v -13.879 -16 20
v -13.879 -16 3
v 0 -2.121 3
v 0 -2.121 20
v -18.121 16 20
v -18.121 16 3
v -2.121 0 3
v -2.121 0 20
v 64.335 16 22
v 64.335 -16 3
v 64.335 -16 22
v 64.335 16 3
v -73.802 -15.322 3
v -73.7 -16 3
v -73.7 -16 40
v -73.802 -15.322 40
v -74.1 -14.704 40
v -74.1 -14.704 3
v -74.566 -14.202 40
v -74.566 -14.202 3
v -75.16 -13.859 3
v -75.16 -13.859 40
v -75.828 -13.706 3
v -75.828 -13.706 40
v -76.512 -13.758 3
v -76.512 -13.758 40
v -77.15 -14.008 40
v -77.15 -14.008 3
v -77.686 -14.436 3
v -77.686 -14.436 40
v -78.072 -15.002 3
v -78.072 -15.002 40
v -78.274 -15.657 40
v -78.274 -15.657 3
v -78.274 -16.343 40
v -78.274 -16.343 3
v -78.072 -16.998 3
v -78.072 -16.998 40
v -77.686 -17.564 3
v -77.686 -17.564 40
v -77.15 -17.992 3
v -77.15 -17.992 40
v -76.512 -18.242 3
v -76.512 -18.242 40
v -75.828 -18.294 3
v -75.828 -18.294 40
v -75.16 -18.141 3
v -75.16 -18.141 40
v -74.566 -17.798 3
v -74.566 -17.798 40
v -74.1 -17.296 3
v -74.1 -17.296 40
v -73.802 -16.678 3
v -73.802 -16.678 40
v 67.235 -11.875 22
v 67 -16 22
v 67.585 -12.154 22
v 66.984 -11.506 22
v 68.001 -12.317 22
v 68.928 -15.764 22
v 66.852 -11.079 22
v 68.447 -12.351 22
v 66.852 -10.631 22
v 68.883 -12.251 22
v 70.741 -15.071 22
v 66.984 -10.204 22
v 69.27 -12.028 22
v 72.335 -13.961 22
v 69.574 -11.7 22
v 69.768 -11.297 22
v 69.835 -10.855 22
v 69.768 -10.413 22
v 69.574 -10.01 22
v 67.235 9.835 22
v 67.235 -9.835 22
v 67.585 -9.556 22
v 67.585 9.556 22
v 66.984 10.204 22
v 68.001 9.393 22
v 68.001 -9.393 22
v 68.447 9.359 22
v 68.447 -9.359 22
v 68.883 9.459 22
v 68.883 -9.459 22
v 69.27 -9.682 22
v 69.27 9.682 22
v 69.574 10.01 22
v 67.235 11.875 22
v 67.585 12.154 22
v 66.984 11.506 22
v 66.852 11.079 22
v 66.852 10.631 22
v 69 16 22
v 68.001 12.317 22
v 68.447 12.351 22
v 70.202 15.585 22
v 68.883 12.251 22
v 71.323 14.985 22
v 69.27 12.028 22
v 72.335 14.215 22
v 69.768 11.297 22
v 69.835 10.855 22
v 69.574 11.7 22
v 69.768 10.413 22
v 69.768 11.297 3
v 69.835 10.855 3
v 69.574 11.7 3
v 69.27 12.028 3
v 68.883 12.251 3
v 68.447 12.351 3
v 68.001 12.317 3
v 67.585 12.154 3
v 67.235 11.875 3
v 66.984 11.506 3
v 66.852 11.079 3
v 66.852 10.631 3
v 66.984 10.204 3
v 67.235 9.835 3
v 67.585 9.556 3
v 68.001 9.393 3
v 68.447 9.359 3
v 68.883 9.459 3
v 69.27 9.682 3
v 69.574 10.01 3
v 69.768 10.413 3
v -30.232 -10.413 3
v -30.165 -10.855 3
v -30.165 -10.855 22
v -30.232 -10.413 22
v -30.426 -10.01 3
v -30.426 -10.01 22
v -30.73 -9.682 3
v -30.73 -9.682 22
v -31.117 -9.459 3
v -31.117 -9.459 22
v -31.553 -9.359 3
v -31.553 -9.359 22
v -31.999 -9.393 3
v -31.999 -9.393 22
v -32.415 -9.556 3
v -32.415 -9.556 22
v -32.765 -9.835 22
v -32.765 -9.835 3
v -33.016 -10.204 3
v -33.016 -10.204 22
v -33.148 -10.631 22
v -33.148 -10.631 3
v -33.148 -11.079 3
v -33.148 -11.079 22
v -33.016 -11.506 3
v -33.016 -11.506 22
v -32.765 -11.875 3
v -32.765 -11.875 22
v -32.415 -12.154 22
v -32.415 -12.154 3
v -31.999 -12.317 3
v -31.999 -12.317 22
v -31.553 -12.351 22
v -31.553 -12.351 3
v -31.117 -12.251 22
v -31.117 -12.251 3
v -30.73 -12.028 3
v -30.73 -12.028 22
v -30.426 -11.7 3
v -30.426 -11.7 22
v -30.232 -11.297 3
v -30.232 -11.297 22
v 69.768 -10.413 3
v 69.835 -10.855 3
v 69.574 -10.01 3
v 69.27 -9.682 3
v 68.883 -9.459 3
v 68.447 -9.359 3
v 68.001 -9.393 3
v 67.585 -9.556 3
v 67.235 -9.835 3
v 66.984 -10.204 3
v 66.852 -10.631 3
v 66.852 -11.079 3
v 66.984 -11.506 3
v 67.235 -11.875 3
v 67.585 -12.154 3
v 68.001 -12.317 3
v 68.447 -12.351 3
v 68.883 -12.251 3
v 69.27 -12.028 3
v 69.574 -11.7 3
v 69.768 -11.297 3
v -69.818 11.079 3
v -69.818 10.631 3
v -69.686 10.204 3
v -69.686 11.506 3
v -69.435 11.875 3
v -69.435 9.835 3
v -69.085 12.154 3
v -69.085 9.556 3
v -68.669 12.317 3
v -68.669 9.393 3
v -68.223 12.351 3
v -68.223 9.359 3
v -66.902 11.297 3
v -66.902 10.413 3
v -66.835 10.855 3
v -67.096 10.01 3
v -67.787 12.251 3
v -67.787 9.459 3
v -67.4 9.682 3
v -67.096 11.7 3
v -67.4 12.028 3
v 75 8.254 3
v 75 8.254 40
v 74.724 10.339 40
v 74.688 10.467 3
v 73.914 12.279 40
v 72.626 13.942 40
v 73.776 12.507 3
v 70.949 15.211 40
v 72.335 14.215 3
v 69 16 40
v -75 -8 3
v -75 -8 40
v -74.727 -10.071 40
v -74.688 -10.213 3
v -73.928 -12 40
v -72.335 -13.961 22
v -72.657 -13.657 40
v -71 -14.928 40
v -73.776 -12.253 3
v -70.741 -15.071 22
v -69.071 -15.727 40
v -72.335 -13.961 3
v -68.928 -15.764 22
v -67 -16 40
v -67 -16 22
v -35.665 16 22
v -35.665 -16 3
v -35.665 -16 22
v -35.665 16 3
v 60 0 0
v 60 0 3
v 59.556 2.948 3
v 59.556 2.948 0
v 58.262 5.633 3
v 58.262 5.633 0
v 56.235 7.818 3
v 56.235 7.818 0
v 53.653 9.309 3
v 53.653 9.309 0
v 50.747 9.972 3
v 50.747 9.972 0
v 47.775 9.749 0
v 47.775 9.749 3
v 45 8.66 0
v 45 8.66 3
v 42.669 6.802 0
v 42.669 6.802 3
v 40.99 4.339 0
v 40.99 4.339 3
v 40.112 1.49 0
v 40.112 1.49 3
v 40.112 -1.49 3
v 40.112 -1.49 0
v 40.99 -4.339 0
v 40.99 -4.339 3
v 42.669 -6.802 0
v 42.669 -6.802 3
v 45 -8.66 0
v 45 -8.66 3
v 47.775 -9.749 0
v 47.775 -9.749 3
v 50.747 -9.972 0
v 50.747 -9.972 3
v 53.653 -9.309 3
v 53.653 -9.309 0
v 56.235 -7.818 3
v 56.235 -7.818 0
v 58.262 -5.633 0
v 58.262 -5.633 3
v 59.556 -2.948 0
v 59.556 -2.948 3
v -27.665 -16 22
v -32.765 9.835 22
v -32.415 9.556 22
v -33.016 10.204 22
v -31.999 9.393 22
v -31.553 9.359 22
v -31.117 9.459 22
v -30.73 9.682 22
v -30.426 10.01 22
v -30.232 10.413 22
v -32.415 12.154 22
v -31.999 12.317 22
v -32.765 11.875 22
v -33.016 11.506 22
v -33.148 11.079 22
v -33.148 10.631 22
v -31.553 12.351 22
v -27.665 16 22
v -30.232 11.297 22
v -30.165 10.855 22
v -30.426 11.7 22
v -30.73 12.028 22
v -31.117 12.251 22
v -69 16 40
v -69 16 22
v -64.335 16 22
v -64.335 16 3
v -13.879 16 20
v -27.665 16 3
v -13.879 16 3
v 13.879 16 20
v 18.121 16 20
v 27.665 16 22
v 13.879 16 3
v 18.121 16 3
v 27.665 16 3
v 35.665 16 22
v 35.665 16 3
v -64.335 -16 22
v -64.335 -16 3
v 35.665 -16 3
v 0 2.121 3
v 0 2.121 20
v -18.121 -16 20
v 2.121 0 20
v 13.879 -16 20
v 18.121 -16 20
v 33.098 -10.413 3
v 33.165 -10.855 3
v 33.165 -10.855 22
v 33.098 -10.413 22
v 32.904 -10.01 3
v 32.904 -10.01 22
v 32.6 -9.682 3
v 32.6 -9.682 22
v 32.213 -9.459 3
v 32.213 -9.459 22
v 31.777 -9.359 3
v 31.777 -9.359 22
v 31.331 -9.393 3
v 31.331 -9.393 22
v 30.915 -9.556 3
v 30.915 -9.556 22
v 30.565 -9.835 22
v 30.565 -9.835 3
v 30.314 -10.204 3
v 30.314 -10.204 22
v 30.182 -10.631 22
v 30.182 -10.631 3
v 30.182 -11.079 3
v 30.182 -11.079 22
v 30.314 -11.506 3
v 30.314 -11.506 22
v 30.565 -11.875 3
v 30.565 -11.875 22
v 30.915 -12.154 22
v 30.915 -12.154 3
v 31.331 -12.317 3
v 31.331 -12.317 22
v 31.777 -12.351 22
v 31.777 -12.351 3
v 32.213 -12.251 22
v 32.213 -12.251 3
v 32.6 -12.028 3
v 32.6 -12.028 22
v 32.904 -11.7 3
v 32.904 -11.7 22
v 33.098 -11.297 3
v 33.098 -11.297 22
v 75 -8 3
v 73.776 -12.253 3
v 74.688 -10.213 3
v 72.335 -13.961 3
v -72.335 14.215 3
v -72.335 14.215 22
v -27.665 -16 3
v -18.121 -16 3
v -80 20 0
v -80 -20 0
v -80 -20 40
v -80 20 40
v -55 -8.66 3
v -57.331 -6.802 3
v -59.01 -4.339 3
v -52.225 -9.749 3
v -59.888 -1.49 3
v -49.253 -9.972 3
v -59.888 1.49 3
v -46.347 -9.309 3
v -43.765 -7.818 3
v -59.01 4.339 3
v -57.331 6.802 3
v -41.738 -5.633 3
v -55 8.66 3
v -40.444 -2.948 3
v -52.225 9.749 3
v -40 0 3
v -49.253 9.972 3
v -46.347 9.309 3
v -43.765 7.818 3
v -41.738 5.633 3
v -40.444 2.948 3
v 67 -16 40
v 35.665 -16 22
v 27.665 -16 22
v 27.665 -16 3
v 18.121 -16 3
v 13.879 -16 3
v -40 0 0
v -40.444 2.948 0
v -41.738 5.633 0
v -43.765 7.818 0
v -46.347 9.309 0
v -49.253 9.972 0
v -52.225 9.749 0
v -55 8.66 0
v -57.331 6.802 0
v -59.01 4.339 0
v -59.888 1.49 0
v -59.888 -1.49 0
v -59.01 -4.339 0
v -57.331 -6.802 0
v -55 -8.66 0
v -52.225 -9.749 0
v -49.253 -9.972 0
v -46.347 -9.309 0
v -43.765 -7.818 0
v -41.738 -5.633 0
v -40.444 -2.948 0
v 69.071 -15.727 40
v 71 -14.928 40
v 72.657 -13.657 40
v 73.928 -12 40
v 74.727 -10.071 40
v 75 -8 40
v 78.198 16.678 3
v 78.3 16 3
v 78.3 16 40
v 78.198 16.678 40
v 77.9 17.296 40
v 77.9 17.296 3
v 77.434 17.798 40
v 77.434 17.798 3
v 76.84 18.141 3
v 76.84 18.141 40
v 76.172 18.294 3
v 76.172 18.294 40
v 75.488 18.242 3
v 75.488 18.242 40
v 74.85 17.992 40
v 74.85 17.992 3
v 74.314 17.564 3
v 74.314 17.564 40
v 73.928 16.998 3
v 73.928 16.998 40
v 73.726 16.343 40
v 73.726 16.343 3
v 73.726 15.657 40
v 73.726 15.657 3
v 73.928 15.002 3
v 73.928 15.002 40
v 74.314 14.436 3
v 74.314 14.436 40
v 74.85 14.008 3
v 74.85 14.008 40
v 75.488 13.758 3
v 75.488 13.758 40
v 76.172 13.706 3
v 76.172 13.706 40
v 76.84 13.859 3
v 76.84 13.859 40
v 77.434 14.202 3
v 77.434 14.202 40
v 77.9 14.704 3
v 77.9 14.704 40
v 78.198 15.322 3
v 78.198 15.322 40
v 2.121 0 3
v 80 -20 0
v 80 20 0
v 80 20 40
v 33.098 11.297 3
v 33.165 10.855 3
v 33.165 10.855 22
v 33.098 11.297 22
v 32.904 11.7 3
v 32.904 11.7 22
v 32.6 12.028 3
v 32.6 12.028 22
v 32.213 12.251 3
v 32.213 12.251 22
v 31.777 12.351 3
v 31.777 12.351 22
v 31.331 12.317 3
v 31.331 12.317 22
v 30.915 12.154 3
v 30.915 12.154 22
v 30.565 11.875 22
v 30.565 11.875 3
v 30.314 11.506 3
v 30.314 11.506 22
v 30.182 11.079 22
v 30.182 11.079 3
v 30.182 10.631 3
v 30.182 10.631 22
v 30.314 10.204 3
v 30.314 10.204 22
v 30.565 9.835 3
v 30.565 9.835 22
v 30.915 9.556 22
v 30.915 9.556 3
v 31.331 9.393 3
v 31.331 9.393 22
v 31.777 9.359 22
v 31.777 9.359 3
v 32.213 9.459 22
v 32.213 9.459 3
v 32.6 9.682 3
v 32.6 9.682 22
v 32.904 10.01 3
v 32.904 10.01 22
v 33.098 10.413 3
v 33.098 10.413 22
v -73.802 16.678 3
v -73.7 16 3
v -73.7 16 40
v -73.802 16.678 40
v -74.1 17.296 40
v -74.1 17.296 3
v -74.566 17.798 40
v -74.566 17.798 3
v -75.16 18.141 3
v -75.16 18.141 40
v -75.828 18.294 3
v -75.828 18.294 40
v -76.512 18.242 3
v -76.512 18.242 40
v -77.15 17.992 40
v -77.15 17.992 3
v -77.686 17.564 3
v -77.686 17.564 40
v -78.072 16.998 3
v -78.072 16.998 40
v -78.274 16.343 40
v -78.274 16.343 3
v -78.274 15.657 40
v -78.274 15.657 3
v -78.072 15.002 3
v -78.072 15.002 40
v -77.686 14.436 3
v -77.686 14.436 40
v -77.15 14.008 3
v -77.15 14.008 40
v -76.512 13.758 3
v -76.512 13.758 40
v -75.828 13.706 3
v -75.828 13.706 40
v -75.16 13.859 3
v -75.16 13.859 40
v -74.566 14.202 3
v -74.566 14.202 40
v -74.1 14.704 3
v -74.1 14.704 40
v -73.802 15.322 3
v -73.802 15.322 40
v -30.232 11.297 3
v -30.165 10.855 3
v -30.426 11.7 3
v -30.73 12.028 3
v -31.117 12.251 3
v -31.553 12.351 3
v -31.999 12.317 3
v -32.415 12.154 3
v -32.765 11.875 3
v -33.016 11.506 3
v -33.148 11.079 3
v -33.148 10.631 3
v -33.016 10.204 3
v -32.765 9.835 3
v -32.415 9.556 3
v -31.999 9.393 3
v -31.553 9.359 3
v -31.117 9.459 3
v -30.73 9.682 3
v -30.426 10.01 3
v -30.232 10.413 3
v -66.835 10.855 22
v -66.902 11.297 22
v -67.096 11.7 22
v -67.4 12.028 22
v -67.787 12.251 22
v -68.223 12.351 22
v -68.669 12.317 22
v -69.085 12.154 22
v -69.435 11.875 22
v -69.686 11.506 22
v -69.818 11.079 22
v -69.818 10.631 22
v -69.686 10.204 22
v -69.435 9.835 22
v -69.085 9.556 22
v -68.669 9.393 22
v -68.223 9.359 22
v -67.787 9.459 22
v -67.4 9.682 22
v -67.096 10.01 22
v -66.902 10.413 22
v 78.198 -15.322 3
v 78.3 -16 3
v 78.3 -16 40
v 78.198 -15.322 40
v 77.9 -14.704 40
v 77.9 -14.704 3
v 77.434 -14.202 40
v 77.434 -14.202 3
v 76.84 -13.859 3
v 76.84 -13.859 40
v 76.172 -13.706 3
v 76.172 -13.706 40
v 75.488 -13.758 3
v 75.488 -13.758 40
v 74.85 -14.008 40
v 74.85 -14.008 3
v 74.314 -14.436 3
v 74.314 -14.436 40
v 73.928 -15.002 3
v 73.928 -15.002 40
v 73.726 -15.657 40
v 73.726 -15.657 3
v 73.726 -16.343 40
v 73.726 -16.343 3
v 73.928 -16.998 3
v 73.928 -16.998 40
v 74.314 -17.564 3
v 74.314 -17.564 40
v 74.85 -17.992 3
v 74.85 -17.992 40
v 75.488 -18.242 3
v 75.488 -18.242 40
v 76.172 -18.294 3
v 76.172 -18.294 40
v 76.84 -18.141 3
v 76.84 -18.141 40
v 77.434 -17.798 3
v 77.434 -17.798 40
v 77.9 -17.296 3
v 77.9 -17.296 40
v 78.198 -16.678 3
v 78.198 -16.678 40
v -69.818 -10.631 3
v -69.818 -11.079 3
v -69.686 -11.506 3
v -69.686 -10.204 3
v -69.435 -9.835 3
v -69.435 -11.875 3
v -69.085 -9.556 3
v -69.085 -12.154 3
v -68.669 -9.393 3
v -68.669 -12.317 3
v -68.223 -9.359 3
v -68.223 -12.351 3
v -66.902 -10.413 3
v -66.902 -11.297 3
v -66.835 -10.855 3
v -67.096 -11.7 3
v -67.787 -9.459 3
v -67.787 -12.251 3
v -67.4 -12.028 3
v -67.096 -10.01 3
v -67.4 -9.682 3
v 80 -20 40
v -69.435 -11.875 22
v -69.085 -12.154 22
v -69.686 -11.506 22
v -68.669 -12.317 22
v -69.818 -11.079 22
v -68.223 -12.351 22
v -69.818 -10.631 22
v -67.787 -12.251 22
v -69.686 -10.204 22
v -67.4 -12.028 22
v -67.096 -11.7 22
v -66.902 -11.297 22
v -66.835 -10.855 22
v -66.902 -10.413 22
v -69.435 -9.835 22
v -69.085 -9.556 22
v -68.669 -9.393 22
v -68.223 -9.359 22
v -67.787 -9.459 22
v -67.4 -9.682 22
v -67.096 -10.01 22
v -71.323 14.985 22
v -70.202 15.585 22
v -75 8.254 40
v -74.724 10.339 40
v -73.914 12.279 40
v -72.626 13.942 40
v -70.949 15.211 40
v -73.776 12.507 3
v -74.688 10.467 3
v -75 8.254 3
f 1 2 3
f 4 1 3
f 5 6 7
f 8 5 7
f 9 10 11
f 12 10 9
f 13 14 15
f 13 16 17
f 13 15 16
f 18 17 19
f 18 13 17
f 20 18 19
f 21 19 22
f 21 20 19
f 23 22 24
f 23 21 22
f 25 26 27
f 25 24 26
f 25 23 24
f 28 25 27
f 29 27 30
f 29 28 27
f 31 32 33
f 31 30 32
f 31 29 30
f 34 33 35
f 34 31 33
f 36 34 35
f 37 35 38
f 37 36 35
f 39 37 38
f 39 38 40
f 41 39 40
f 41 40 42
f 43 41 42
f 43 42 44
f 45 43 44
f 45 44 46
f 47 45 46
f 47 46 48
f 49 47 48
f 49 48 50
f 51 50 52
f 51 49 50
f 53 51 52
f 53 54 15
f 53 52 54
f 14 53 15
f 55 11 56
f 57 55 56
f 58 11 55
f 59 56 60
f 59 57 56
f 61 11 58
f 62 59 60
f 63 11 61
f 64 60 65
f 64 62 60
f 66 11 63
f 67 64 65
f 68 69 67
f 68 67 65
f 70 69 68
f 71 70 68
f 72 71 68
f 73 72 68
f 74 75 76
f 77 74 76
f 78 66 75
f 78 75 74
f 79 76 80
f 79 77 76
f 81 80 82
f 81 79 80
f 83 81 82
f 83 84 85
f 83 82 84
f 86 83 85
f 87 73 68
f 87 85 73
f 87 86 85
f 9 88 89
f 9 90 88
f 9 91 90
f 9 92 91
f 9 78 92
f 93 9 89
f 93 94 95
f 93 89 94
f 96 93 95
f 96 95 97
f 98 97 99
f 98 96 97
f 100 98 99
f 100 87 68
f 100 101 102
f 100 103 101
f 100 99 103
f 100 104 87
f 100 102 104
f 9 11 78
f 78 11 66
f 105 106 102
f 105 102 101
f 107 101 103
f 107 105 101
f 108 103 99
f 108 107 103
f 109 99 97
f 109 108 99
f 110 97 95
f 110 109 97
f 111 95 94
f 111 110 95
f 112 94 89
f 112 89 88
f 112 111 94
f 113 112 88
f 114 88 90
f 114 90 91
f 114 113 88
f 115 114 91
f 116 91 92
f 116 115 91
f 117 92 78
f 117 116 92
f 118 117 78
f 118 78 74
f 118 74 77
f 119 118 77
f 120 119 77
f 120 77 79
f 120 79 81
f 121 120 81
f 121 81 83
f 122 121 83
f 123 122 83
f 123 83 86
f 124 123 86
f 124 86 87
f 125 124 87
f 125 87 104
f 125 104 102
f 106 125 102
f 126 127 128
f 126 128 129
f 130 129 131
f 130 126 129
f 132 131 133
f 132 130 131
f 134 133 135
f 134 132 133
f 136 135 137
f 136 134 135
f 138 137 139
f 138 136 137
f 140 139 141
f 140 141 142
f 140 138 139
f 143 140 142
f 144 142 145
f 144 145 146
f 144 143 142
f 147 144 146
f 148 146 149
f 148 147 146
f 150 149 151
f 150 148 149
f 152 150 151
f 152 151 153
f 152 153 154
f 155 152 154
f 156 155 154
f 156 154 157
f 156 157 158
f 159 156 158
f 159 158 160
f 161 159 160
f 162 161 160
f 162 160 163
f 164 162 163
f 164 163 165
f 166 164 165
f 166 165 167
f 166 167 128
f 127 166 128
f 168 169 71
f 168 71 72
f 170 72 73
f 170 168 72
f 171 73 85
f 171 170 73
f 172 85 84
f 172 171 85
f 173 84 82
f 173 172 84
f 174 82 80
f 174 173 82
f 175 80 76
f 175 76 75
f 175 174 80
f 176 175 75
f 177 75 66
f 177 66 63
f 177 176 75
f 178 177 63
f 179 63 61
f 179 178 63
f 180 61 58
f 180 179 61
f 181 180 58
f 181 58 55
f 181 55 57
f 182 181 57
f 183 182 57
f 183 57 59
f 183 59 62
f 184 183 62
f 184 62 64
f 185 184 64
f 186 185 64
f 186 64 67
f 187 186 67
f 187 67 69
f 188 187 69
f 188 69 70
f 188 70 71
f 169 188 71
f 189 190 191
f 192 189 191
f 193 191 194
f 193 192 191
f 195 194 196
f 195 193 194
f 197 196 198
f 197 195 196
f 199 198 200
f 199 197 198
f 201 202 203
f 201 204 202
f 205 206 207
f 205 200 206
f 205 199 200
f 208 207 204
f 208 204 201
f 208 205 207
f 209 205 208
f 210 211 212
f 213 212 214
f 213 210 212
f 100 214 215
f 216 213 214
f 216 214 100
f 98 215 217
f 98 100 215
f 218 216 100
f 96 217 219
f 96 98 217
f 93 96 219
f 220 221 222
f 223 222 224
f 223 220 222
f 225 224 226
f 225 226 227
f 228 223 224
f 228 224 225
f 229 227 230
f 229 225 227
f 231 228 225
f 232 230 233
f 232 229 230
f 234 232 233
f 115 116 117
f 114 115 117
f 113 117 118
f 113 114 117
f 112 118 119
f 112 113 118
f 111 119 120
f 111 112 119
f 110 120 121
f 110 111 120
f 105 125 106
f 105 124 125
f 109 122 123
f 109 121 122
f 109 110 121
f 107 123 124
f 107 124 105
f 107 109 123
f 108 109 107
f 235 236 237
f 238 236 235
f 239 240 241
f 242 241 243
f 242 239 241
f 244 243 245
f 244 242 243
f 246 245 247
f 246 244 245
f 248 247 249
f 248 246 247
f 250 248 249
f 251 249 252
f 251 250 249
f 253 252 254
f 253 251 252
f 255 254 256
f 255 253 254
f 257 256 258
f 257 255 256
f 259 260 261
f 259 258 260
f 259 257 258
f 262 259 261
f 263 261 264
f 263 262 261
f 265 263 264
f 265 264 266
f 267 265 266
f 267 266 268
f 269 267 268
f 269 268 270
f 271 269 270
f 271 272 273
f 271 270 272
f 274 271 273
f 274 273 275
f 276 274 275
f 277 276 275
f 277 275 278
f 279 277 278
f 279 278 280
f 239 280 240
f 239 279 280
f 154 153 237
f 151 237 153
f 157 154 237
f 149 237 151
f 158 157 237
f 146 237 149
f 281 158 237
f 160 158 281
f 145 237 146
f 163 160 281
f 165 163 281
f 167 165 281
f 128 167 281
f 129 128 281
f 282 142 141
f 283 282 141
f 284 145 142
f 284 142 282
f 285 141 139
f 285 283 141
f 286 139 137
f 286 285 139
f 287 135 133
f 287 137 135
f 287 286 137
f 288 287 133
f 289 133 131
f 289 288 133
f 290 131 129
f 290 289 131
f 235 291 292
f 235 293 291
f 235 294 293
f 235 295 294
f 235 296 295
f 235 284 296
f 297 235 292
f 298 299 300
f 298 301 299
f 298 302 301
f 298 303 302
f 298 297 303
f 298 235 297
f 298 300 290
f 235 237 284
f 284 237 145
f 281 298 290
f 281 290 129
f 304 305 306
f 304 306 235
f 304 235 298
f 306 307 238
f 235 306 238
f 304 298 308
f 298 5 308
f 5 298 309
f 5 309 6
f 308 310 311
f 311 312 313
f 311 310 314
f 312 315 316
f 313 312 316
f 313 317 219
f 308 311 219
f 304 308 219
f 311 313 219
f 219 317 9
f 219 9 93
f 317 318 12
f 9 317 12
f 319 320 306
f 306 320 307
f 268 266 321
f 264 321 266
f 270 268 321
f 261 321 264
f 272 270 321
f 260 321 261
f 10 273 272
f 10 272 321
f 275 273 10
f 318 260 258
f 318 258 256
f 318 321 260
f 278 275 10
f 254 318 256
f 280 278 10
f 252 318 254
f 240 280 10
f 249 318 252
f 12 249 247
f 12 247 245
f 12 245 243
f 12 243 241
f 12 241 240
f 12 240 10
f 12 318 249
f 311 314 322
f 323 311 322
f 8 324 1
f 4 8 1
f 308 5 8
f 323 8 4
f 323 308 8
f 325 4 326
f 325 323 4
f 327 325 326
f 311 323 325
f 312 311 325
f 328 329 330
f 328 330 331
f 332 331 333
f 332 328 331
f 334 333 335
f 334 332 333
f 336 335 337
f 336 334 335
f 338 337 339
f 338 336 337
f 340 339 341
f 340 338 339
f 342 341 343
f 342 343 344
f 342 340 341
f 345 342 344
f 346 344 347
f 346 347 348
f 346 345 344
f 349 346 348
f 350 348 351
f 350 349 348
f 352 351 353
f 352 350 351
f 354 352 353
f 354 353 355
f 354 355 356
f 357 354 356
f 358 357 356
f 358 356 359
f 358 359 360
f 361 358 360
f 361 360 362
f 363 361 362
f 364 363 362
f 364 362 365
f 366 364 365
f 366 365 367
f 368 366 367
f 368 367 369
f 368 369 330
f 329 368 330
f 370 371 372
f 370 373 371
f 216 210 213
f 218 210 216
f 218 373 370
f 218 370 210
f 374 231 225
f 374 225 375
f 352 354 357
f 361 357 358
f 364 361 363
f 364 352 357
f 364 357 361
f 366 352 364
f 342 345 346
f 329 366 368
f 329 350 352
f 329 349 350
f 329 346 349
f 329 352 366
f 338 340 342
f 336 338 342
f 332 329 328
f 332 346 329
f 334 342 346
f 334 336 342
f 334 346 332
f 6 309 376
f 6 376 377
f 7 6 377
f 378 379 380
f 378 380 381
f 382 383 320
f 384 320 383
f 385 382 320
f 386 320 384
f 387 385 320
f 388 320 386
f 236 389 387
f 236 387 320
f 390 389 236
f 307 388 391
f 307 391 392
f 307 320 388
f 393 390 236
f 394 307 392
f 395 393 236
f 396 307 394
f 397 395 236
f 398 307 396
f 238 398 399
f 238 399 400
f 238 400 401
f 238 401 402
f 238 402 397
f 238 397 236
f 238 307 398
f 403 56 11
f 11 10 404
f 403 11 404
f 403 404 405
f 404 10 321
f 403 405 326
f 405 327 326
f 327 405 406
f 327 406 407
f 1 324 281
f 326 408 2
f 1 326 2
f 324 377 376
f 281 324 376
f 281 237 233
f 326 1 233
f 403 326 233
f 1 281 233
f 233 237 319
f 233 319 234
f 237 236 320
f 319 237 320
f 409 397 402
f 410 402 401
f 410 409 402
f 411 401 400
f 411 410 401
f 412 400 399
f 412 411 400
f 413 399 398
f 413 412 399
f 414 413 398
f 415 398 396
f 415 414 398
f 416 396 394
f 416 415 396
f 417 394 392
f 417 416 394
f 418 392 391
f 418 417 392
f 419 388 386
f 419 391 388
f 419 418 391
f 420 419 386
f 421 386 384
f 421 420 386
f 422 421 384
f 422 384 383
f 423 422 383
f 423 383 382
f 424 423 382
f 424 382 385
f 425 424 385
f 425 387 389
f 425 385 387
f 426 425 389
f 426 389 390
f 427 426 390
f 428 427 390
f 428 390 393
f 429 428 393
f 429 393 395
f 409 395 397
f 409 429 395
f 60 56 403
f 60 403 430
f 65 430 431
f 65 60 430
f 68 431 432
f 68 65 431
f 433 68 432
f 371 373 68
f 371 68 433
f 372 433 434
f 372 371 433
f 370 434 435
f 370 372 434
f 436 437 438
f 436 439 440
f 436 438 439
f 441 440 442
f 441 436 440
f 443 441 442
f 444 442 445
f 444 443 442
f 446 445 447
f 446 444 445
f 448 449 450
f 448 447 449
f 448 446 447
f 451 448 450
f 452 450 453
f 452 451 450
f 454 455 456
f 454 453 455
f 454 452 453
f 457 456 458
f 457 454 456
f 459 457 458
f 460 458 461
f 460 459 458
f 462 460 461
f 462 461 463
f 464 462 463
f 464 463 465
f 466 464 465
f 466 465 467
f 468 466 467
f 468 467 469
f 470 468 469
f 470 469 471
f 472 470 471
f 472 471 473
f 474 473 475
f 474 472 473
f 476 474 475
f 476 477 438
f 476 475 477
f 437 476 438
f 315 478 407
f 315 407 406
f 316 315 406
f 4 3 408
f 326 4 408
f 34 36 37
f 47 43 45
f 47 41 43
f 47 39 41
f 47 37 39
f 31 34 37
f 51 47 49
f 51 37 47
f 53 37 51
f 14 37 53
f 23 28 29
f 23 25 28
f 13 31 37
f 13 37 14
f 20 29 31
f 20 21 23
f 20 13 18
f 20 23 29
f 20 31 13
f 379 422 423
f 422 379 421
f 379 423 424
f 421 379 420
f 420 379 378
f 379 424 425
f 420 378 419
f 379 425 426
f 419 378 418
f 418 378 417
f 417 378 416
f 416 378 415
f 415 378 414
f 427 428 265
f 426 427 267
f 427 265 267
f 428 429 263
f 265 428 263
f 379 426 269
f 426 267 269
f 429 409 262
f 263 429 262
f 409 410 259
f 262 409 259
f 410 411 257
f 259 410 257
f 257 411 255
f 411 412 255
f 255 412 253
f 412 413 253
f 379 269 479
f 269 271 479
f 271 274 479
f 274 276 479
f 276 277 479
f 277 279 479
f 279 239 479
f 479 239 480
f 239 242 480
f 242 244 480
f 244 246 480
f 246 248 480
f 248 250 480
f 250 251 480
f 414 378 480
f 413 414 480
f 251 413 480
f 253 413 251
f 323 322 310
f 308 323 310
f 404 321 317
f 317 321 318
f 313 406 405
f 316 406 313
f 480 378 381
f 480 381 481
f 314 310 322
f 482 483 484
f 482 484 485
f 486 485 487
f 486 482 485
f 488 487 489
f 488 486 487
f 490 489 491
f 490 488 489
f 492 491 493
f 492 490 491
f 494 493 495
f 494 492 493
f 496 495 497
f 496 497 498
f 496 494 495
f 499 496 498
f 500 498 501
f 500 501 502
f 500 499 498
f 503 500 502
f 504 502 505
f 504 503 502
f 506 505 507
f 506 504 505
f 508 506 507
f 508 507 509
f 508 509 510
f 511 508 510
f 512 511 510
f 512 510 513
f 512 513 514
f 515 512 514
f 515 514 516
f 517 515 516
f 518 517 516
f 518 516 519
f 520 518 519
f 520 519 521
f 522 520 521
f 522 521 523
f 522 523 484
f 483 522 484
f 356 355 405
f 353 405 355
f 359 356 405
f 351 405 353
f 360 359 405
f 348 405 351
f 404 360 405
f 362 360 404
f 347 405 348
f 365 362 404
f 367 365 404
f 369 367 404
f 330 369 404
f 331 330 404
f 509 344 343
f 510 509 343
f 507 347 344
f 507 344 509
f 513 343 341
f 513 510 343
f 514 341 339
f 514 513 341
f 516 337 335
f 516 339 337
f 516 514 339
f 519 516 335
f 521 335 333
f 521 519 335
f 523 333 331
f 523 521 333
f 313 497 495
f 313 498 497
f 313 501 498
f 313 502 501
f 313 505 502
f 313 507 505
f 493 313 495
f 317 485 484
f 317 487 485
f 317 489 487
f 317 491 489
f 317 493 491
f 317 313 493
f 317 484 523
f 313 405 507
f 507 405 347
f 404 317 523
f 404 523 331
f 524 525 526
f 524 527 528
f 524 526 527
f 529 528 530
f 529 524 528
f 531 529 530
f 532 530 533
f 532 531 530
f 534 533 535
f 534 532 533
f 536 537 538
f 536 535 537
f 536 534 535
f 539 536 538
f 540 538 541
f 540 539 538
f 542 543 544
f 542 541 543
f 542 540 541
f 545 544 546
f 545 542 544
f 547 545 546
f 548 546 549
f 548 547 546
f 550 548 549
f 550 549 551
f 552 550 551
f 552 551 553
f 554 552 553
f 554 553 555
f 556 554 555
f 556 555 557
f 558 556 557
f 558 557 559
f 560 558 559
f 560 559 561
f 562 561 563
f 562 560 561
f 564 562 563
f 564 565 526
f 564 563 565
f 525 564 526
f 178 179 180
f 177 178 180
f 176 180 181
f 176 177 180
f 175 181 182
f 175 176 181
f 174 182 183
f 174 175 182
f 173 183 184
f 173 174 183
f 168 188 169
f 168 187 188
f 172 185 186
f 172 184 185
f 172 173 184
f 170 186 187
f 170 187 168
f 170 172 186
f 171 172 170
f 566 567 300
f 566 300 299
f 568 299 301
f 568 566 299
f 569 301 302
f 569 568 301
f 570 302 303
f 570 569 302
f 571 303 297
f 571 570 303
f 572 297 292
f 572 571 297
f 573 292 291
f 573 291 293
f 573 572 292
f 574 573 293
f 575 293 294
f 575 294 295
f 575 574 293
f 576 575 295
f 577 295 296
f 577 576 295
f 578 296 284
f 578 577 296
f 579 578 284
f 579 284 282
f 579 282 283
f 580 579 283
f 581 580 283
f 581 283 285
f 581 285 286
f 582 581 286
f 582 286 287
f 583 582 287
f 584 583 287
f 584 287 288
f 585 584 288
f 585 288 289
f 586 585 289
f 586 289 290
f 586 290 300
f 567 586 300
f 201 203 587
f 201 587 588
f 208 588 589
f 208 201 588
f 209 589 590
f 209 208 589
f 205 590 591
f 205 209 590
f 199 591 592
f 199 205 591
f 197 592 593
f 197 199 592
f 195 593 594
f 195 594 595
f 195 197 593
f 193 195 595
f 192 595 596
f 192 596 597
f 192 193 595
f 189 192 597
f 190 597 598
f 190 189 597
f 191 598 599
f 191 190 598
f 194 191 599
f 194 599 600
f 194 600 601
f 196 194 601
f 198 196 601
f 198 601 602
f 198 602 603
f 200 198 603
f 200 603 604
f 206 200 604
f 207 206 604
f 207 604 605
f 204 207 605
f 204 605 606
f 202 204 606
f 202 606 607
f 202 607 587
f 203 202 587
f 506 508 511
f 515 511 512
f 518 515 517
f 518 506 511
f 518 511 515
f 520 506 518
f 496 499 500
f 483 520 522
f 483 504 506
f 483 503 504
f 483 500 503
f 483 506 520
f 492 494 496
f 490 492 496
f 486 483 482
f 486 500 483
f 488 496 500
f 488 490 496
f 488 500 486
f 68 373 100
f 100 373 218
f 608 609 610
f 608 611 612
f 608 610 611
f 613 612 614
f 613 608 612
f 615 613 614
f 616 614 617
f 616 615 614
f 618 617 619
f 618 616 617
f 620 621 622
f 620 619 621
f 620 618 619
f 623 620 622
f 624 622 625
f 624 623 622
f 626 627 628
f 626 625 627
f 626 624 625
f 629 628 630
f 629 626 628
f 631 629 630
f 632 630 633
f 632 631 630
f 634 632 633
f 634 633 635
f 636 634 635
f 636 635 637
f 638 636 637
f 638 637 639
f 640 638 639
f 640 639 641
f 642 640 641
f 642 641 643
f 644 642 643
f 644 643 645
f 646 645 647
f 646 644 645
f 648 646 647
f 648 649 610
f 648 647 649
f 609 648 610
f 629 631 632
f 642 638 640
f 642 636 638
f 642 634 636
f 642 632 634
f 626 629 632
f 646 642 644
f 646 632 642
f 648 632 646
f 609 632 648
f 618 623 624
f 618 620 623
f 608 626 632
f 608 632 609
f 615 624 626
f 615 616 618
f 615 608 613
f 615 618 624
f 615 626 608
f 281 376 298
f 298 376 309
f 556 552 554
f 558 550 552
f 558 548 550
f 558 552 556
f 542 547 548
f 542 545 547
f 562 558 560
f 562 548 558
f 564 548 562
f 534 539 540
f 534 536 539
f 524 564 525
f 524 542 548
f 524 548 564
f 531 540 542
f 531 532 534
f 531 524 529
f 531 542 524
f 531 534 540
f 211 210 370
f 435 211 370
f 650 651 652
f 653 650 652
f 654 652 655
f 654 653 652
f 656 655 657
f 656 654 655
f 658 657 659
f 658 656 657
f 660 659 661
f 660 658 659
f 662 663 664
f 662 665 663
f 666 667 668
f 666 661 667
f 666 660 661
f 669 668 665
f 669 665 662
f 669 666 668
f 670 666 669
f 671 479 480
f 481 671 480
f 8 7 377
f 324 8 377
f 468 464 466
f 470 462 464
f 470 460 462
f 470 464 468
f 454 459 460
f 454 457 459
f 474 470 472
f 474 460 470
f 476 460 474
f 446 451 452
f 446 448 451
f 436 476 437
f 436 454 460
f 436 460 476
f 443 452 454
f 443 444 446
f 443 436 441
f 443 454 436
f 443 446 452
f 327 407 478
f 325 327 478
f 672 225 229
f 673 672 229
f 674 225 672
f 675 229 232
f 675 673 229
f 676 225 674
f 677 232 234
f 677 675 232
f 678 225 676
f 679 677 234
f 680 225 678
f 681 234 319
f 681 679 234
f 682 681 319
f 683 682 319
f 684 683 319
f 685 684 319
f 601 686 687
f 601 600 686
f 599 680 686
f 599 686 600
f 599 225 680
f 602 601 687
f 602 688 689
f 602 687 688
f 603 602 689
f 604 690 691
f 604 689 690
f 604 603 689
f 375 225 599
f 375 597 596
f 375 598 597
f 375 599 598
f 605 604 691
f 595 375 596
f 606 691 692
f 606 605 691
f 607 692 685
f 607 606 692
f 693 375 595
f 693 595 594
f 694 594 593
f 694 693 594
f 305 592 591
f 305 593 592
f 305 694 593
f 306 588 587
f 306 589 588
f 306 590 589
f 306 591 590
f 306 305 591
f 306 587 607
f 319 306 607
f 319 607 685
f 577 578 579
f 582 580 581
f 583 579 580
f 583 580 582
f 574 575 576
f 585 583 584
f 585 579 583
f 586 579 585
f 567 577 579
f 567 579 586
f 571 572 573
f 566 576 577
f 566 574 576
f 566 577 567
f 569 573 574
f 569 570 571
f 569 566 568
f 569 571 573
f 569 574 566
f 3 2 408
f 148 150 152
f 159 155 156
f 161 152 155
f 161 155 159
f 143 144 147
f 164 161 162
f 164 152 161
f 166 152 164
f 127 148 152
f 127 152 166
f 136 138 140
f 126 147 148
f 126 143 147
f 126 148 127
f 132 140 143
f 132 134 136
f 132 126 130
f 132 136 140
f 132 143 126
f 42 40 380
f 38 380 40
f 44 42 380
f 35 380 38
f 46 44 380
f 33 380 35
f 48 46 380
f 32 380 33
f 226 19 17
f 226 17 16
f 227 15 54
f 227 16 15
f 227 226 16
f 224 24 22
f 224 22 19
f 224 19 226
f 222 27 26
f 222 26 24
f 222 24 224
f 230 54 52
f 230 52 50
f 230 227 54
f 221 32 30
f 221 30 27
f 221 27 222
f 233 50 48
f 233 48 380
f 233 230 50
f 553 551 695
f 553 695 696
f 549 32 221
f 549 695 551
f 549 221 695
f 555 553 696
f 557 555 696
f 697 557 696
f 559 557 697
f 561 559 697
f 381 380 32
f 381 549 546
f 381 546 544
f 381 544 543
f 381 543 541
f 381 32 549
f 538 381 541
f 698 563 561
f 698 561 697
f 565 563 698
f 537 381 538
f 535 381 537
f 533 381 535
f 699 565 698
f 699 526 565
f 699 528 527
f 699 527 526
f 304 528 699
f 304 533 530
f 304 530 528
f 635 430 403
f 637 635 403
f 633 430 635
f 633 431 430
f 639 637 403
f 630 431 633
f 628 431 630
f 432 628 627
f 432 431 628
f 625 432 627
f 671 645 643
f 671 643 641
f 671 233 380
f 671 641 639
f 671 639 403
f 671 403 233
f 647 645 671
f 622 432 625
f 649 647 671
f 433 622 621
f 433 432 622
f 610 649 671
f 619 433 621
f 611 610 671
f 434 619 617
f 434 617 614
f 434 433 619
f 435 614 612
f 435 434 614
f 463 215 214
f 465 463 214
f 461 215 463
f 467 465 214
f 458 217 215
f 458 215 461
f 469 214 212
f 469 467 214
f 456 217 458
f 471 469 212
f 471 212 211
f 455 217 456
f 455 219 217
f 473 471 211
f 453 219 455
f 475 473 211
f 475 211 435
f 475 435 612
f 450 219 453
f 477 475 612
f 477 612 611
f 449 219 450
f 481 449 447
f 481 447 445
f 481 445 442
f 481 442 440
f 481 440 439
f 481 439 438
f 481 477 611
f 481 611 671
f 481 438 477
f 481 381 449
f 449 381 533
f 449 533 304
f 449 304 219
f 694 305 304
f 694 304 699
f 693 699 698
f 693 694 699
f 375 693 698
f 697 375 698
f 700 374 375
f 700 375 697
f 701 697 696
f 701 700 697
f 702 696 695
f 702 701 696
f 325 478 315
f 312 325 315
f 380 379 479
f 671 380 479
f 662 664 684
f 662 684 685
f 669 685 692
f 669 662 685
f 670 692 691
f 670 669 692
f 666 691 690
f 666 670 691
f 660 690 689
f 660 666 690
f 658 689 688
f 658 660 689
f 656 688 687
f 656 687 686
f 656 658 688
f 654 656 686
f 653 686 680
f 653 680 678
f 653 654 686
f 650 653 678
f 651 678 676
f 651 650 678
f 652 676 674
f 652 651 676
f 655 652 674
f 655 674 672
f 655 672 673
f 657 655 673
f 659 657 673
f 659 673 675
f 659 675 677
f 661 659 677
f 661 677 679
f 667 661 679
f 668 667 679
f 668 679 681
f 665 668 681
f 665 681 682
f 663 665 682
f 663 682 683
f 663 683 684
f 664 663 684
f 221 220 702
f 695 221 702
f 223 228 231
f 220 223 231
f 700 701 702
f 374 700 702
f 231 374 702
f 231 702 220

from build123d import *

# Parameters (mm, degrees)
SKETCH005_R  = 1.5
PAD004_DEPTH = 22
SKETCH004_W  = 8
SKETCH004_H  = 38
PAD003_DEPTH = 22
SKETCH006_R  = 2.3
PAD005_DEPTH = 70
SKETCH002_W  = 160
SKETCH002_H  = 40
PAD002_DEPTH = 40
SKETCH_R     = 10
PAD001_DEPTH = 5
SKETCH001_W  = 160
SKETCH001_H  = 40
PAD_DEPTH    = 3
PAD006_DEPTH = 20


with BuildPart() as pylon_thread_holes:
    # Sketch005 → Pad004 (new body)
    with BuildSketch(Plane.XY):
        with Locations((-68.335, 10.855)):
            Circle(SKETCH005_R)
        with Locations((-31.665, 10.855)):
            Circle(SKETCH005_R)
        with Locations((-68.335, -10.855)):
            Circle(SKETCH005_R)
        with Locations((-31.665, -10.855)):
            Circle(SKETCH005_R)
        with Locations((31.665, 10.855)):
            Circle(SKETCH005_R)
        with Locations((31.665, -10.855)):
            Circle(SKETCH005_R)
        with Locations((68.335, 10.855)):
            Circle(SKETCH005_R)
        with Locations((68.335, -10.855)):
            Circle(SKETCH005_R)
    extrude(amount=PAD004_DEPTH)


with BuildPart() as pylons:
    # Sketch004 → Pad003 (new body)
    with BuildSketch(Plane.XY):
        with Locations((-68.335, 0)):
            Rectangle(SKETCH004_W, SKETCH004_H)
        with Locations((-31.665, 0)):
            Rectangle(SKETCH004_W, SKETCH004_H)
        with Locations((31.665, 0)):
            Rectangle(SKETCH004_W, SKETCH004_H)
        with Locations((68.335, 0)):
            Rectangle(SKETCH004_W, SKETCH004_H)
    extrude(amount=PAD003_DEPTH)

    # Cut001: cut Pylon Thread Holes
    add(pylon_thread_holes.part, mode=Mode.SUBTRACT)


with BuildPart() as back_panel_screw_holes:
    # Sketch006 → Pad005 (new body)
    with BuildSketch(Plane.XY):
        with Locations((-76, 16)):
            Circle(SKETCH006_R)
        with Locations((-76, -16)):
            Circle(SKETCH006_R)
        with Locations((76, 16)):
            Circle(SKETCH006_R)
        with Locations((76, -16)):
            Circle(SKETCH006_R)
    extrude(amount=PAD005_DEPTH)


with BuildPart() as sidewall:
    # Sketch002 → Pad002 (new body)
    with BuildSketch(Plane.XY):
        Rectangle(SKETCH002_W, SKETCH002_H)
        with BuildLine():
            Line((75, 8.254033), (75, -8))
            ThreePointArc((67, -16), (72.656854, -13.656854), (75, -8))
            Line((67, -16), (-67, -16))
            ThreePointArc((-75, -8), (-72.656854, -13.656854), (-67, -16))
            Line((-75, -8), (-75, 8.254033))
            ThreePointArc((-69, 16), (-73.324555, 13.153013), (-75, 8.254033))
            Line((-69, 16), (69, 16))
            ThreePointArc((75, 8.254033), (73.324555, 13.153013), (69, 16))
        make_face(mode=Mode.SUBTRACT)
    extrude(amount=PAD002_DEPTH)

    # Cut002: cut Back Panel Screw Holes
    add(back_panel_screw_holes.part, mode=Mode.SUBTRACT)


with BuildPart() as lens_holes:
    # Sketch → Pad001 (new body)
    with BuildSketch(Plane.XY):
        with Locations((-50, 0)):
            Circle(SKETCH_R)
        with Locations((50, 0)):
            Circle(SKETCH_R)
    extrude(amount=PAD001_DEPTH)


with BuildPart() as whole:
    # Sketch001 → Pad (new body)
    with BuildSketch(Plane.XY):
        Rectangle(SKETCH001_W, SKETCH001_H)
    extrude(amount=PAD_DEPTH)

    # Cut: cut Lens Holes
    add(lens_holes.part, mode=Mode.SUBTRACT)

    # Fusion: union Sidewall
    add(sidewall.part)

    # Fusion001: union Pylons
    add(pylons.part)


with BuildPart() as fusion002:
    # Sketch007 → Pad006 (new body)
    with BuildSketch(Plane.XY):
        Polygon((-21.12132, 19), (-2.12132, 0), (-21.12132, -19), (-16.87868, -19), (0, -2.12132), (16.87868, -19), (21.12132, -19), (2.12132, 0), (21.12132, 19), (16.87868, 19), (0, 2.12132), (-16.87868, 19), align=None)
    extrude(amount=PAD006_DEPTH)

    # Fusion002: union Whole
    add(whole.part)


solid = fusion002.part
